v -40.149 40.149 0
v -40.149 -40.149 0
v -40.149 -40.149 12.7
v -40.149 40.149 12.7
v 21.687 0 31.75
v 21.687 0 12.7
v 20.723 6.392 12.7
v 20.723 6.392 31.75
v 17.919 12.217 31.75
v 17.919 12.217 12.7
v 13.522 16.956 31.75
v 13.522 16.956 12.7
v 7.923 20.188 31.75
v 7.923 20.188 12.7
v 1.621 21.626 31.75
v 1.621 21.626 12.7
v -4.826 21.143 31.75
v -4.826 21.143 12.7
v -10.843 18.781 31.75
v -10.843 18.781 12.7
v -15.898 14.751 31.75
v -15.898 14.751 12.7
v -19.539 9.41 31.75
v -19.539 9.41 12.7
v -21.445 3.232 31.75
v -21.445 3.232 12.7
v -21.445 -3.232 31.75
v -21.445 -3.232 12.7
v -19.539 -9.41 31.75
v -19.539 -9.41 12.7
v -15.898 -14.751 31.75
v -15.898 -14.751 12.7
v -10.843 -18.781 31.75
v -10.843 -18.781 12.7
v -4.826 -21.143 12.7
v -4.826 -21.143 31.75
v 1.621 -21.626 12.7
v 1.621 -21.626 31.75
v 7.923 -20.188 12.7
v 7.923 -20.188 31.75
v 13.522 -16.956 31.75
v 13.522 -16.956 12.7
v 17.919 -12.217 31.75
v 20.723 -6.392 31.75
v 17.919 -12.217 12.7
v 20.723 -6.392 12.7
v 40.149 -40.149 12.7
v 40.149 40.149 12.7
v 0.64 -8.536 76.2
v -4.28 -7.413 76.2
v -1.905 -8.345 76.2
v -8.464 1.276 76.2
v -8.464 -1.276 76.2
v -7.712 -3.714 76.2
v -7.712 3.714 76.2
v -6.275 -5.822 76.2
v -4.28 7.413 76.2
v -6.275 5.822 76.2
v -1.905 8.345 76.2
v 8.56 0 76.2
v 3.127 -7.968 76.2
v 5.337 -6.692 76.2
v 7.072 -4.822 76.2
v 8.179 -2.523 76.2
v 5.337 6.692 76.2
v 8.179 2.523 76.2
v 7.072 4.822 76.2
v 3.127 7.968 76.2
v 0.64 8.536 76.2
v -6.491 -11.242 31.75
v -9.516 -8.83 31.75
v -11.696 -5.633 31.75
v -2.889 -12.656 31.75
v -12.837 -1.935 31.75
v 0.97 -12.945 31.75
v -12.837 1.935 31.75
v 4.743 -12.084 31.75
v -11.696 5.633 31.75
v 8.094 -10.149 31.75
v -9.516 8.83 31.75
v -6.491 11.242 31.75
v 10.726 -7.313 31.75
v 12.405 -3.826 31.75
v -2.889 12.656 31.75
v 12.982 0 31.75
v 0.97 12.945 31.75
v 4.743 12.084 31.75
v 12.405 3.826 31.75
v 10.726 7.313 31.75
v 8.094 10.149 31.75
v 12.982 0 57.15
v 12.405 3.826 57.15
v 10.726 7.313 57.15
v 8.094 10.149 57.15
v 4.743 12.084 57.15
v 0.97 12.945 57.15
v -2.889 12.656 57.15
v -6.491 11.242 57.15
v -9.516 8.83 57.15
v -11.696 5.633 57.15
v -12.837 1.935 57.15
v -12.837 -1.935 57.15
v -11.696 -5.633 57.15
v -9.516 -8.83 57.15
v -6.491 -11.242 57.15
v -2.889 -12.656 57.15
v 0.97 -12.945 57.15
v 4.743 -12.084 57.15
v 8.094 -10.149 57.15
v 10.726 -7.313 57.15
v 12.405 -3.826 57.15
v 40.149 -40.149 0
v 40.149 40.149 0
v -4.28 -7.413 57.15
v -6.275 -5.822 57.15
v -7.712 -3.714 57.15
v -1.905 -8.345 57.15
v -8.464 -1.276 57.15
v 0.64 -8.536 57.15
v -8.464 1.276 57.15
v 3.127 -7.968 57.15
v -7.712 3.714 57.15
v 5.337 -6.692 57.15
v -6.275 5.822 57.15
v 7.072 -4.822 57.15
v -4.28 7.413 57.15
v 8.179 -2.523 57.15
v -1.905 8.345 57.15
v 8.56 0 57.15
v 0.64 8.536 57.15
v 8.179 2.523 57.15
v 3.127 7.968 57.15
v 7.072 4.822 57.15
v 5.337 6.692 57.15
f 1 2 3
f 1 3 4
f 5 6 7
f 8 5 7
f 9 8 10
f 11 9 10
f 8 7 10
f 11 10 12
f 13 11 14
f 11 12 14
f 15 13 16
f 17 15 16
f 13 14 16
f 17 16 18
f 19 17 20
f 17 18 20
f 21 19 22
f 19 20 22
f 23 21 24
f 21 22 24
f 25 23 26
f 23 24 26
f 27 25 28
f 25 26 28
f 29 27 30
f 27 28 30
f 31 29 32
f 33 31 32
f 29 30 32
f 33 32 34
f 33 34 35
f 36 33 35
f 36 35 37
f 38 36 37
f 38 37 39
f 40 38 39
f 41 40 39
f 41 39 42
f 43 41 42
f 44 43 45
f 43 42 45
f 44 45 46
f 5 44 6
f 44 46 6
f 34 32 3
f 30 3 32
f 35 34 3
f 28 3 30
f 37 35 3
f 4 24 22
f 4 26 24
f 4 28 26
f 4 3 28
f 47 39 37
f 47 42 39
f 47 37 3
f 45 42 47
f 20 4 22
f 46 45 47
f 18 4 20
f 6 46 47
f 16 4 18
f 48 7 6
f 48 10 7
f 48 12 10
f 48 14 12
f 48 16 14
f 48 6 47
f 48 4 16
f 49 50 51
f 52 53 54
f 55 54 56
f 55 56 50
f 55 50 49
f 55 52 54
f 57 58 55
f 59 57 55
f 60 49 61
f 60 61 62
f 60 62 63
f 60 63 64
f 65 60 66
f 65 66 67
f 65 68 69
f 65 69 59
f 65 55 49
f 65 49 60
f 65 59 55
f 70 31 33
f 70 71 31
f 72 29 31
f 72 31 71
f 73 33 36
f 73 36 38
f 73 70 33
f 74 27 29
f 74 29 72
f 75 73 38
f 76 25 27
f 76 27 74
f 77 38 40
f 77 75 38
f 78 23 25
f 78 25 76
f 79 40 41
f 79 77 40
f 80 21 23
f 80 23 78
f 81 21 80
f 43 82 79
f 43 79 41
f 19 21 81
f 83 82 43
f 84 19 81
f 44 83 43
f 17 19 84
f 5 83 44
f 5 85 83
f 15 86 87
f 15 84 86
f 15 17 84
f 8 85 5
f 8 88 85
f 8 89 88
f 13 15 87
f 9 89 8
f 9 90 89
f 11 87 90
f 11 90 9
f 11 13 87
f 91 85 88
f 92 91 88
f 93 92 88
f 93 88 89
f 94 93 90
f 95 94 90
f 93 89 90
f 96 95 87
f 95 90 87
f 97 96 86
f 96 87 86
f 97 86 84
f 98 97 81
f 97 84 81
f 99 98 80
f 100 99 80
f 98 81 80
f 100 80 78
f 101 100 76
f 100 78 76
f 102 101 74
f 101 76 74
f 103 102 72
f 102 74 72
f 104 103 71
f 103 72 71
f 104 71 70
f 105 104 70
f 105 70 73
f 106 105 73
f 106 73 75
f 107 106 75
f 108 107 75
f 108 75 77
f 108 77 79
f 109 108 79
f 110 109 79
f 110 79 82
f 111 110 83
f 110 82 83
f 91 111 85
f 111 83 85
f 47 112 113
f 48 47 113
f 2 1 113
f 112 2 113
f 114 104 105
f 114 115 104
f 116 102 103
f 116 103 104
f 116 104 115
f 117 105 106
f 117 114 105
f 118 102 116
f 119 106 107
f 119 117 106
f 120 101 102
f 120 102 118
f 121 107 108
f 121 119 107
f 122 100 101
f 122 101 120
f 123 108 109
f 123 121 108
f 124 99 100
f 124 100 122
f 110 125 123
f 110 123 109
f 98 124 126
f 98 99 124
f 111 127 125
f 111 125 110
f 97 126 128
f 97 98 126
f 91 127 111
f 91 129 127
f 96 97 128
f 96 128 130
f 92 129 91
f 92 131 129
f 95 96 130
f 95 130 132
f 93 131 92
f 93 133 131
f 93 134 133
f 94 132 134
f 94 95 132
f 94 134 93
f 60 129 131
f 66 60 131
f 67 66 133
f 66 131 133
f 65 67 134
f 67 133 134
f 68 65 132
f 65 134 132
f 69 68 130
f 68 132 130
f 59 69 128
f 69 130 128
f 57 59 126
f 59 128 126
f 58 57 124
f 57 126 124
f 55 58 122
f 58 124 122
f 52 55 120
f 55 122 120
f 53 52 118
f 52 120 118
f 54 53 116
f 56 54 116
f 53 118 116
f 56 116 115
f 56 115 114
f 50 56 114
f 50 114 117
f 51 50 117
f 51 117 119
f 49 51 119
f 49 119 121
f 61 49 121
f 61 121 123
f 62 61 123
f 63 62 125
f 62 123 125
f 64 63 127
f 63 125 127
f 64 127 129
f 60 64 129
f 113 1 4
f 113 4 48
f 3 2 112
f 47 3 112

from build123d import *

# Parameters (mm, degrees)
F0_W     = 80.297806
F0_H     = 80.297806
F1_DEPTH = 12.7
F2_R     = 21.68697
F3_DEPTH = 19.05
F4_R     = 12.981603
F5_DEPTH = 25.4
F6_R     = 8.559501
F7_DEPTH = 19.05


with BuildPart() as f1:
    # F0 (on Top) → F1 (new body)
    with BuildSketch(Plane.XY):
        Rectangle(F0_W, F0_H)
    extrude(amount=F1_DEPTH)

    # F2 (on face) → F3 (join)
    with BuildSketch(Plane.XY.offset(12.7)):
        Circle(F2_R)
    extrude(amount=F3_DEPTH)

    # F4 (on face) → F5 (join)
    with BuildSketch(Plane.XY.offset(31.75)):
        Circle(F4_R)
    extrude(amount=F5_DEPTH)

    # F6 (on face) → F7 (join)
    with BuildSketch(Plane.XY.offset(57.15)):
        Circle(F6_R)
    extrude(amount=F7_DEPTH)


solid = f1.part
